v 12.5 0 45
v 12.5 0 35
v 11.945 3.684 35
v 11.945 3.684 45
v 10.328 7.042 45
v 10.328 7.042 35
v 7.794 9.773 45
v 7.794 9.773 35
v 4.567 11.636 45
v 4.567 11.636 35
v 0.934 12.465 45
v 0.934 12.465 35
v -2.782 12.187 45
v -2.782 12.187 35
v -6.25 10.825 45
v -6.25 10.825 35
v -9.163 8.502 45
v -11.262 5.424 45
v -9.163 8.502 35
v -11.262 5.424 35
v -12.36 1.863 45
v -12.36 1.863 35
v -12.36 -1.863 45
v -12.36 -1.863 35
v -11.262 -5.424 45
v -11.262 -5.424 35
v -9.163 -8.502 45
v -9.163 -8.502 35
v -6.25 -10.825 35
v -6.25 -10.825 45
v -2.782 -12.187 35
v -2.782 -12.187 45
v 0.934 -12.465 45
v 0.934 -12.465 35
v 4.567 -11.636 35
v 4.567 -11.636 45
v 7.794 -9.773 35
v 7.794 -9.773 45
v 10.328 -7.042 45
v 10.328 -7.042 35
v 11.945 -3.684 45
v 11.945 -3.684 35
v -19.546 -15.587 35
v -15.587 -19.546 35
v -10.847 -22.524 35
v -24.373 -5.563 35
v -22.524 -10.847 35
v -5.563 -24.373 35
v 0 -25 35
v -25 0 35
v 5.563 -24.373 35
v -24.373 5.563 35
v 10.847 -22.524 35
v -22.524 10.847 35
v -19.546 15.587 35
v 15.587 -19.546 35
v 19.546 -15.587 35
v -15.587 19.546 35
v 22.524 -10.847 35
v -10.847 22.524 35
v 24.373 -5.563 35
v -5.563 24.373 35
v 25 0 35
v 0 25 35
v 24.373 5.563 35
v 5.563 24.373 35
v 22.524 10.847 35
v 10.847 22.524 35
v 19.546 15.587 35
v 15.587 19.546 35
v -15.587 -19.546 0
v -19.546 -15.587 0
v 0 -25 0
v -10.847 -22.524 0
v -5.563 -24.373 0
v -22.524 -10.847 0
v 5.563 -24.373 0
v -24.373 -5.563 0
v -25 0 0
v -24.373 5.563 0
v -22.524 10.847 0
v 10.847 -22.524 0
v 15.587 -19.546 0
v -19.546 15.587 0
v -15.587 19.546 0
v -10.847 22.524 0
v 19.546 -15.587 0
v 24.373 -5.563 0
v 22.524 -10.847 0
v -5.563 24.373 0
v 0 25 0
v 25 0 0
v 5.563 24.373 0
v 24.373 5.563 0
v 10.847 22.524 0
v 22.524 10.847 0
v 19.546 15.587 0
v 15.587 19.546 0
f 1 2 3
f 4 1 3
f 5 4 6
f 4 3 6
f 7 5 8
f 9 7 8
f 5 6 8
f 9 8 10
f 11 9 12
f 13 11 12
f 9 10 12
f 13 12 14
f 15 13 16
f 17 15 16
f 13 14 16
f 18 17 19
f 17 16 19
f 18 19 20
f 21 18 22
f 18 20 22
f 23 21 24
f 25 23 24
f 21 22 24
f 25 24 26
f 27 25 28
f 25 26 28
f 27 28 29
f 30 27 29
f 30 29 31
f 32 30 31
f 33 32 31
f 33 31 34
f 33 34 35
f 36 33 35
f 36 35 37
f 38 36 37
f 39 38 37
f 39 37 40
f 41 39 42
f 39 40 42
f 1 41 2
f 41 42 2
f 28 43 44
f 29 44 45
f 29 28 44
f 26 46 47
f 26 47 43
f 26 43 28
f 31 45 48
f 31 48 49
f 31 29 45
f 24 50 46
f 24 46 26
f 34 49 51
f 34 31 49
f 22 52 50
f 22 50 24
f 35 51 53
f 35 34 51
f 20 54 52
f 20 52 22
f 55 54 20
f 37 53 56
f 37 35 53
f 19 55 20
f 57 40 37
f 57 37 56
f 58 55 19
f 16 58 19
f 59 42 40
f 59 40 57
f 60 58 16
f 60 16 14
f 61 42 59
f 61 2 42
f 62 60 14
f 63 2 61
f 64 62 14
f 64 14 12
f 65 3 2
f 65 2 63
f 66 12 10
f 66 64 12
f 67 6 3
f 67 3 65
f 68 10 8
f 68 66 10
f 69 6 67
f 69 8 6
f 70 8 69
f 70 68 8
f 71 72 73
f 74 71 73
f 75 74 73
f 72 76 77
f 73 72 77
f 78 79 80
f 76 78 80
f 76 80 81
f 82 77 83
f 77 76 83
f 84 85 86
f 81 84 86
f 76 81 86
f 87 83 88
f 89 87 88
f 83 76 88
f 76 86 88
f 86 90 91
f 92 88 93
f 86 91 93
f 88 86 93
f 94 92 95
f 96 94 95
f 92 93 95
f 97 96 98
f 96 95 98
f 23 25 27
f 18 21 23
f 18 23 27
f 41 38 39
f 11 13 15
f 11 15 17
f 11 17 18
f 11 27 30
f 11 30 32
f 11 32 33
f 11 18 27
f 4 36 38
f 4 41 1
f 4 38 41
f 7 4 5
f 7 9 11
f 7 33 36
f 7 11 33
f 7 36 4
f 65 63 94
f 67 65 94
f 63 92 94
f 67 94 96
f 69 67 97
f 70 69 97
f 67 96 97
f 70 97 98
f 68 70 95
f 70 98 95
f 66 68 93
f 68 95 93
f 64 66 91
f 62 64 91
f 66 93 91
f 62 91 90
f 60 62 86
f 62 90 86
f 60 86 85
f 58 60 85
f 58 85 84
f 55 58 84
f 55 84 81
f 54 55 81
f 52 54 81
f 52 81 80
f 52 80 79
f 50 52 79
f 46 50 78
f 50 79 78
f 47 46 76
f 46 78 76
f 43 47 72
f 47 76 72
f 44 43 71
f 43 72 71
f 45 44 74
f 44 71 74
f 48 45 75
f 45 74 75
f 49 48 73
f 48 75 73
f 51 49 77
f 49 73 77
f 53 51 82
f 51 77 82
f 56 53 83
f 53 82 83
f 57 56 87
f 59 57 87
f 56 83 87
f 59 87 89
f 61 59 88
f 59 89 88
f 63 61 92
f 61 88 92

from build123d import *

# Parameters (mm, degrees)
F1_R      = 25
F2_DEPTH  = 25
F2_FACE_R = 25
F3_DEPTH  = 10
F4_R      = 12.5
F5_DEPTH  = 10


with BuildPart() as f2:
    # F1 (on Top) → F2 (new body)
    with BuildSketch(Plane.XY):
        Circle(F1_R)
    extrude(amount=F2_DEPTH)

    # F2_face (on face) → F3 (join)
    with BuildSketch(Plane.XY.offset(25)):
        Circle(F2_FACE_R)
    extrude(amount=F3_DEPTH)

    # F4 (on offset) → F5 (join)
    with BuildSketch(Plane.XY.offset(35)):
        Circle(F4_R)
    extrude(amount=F5_DEPTH)


solid = f2.part
